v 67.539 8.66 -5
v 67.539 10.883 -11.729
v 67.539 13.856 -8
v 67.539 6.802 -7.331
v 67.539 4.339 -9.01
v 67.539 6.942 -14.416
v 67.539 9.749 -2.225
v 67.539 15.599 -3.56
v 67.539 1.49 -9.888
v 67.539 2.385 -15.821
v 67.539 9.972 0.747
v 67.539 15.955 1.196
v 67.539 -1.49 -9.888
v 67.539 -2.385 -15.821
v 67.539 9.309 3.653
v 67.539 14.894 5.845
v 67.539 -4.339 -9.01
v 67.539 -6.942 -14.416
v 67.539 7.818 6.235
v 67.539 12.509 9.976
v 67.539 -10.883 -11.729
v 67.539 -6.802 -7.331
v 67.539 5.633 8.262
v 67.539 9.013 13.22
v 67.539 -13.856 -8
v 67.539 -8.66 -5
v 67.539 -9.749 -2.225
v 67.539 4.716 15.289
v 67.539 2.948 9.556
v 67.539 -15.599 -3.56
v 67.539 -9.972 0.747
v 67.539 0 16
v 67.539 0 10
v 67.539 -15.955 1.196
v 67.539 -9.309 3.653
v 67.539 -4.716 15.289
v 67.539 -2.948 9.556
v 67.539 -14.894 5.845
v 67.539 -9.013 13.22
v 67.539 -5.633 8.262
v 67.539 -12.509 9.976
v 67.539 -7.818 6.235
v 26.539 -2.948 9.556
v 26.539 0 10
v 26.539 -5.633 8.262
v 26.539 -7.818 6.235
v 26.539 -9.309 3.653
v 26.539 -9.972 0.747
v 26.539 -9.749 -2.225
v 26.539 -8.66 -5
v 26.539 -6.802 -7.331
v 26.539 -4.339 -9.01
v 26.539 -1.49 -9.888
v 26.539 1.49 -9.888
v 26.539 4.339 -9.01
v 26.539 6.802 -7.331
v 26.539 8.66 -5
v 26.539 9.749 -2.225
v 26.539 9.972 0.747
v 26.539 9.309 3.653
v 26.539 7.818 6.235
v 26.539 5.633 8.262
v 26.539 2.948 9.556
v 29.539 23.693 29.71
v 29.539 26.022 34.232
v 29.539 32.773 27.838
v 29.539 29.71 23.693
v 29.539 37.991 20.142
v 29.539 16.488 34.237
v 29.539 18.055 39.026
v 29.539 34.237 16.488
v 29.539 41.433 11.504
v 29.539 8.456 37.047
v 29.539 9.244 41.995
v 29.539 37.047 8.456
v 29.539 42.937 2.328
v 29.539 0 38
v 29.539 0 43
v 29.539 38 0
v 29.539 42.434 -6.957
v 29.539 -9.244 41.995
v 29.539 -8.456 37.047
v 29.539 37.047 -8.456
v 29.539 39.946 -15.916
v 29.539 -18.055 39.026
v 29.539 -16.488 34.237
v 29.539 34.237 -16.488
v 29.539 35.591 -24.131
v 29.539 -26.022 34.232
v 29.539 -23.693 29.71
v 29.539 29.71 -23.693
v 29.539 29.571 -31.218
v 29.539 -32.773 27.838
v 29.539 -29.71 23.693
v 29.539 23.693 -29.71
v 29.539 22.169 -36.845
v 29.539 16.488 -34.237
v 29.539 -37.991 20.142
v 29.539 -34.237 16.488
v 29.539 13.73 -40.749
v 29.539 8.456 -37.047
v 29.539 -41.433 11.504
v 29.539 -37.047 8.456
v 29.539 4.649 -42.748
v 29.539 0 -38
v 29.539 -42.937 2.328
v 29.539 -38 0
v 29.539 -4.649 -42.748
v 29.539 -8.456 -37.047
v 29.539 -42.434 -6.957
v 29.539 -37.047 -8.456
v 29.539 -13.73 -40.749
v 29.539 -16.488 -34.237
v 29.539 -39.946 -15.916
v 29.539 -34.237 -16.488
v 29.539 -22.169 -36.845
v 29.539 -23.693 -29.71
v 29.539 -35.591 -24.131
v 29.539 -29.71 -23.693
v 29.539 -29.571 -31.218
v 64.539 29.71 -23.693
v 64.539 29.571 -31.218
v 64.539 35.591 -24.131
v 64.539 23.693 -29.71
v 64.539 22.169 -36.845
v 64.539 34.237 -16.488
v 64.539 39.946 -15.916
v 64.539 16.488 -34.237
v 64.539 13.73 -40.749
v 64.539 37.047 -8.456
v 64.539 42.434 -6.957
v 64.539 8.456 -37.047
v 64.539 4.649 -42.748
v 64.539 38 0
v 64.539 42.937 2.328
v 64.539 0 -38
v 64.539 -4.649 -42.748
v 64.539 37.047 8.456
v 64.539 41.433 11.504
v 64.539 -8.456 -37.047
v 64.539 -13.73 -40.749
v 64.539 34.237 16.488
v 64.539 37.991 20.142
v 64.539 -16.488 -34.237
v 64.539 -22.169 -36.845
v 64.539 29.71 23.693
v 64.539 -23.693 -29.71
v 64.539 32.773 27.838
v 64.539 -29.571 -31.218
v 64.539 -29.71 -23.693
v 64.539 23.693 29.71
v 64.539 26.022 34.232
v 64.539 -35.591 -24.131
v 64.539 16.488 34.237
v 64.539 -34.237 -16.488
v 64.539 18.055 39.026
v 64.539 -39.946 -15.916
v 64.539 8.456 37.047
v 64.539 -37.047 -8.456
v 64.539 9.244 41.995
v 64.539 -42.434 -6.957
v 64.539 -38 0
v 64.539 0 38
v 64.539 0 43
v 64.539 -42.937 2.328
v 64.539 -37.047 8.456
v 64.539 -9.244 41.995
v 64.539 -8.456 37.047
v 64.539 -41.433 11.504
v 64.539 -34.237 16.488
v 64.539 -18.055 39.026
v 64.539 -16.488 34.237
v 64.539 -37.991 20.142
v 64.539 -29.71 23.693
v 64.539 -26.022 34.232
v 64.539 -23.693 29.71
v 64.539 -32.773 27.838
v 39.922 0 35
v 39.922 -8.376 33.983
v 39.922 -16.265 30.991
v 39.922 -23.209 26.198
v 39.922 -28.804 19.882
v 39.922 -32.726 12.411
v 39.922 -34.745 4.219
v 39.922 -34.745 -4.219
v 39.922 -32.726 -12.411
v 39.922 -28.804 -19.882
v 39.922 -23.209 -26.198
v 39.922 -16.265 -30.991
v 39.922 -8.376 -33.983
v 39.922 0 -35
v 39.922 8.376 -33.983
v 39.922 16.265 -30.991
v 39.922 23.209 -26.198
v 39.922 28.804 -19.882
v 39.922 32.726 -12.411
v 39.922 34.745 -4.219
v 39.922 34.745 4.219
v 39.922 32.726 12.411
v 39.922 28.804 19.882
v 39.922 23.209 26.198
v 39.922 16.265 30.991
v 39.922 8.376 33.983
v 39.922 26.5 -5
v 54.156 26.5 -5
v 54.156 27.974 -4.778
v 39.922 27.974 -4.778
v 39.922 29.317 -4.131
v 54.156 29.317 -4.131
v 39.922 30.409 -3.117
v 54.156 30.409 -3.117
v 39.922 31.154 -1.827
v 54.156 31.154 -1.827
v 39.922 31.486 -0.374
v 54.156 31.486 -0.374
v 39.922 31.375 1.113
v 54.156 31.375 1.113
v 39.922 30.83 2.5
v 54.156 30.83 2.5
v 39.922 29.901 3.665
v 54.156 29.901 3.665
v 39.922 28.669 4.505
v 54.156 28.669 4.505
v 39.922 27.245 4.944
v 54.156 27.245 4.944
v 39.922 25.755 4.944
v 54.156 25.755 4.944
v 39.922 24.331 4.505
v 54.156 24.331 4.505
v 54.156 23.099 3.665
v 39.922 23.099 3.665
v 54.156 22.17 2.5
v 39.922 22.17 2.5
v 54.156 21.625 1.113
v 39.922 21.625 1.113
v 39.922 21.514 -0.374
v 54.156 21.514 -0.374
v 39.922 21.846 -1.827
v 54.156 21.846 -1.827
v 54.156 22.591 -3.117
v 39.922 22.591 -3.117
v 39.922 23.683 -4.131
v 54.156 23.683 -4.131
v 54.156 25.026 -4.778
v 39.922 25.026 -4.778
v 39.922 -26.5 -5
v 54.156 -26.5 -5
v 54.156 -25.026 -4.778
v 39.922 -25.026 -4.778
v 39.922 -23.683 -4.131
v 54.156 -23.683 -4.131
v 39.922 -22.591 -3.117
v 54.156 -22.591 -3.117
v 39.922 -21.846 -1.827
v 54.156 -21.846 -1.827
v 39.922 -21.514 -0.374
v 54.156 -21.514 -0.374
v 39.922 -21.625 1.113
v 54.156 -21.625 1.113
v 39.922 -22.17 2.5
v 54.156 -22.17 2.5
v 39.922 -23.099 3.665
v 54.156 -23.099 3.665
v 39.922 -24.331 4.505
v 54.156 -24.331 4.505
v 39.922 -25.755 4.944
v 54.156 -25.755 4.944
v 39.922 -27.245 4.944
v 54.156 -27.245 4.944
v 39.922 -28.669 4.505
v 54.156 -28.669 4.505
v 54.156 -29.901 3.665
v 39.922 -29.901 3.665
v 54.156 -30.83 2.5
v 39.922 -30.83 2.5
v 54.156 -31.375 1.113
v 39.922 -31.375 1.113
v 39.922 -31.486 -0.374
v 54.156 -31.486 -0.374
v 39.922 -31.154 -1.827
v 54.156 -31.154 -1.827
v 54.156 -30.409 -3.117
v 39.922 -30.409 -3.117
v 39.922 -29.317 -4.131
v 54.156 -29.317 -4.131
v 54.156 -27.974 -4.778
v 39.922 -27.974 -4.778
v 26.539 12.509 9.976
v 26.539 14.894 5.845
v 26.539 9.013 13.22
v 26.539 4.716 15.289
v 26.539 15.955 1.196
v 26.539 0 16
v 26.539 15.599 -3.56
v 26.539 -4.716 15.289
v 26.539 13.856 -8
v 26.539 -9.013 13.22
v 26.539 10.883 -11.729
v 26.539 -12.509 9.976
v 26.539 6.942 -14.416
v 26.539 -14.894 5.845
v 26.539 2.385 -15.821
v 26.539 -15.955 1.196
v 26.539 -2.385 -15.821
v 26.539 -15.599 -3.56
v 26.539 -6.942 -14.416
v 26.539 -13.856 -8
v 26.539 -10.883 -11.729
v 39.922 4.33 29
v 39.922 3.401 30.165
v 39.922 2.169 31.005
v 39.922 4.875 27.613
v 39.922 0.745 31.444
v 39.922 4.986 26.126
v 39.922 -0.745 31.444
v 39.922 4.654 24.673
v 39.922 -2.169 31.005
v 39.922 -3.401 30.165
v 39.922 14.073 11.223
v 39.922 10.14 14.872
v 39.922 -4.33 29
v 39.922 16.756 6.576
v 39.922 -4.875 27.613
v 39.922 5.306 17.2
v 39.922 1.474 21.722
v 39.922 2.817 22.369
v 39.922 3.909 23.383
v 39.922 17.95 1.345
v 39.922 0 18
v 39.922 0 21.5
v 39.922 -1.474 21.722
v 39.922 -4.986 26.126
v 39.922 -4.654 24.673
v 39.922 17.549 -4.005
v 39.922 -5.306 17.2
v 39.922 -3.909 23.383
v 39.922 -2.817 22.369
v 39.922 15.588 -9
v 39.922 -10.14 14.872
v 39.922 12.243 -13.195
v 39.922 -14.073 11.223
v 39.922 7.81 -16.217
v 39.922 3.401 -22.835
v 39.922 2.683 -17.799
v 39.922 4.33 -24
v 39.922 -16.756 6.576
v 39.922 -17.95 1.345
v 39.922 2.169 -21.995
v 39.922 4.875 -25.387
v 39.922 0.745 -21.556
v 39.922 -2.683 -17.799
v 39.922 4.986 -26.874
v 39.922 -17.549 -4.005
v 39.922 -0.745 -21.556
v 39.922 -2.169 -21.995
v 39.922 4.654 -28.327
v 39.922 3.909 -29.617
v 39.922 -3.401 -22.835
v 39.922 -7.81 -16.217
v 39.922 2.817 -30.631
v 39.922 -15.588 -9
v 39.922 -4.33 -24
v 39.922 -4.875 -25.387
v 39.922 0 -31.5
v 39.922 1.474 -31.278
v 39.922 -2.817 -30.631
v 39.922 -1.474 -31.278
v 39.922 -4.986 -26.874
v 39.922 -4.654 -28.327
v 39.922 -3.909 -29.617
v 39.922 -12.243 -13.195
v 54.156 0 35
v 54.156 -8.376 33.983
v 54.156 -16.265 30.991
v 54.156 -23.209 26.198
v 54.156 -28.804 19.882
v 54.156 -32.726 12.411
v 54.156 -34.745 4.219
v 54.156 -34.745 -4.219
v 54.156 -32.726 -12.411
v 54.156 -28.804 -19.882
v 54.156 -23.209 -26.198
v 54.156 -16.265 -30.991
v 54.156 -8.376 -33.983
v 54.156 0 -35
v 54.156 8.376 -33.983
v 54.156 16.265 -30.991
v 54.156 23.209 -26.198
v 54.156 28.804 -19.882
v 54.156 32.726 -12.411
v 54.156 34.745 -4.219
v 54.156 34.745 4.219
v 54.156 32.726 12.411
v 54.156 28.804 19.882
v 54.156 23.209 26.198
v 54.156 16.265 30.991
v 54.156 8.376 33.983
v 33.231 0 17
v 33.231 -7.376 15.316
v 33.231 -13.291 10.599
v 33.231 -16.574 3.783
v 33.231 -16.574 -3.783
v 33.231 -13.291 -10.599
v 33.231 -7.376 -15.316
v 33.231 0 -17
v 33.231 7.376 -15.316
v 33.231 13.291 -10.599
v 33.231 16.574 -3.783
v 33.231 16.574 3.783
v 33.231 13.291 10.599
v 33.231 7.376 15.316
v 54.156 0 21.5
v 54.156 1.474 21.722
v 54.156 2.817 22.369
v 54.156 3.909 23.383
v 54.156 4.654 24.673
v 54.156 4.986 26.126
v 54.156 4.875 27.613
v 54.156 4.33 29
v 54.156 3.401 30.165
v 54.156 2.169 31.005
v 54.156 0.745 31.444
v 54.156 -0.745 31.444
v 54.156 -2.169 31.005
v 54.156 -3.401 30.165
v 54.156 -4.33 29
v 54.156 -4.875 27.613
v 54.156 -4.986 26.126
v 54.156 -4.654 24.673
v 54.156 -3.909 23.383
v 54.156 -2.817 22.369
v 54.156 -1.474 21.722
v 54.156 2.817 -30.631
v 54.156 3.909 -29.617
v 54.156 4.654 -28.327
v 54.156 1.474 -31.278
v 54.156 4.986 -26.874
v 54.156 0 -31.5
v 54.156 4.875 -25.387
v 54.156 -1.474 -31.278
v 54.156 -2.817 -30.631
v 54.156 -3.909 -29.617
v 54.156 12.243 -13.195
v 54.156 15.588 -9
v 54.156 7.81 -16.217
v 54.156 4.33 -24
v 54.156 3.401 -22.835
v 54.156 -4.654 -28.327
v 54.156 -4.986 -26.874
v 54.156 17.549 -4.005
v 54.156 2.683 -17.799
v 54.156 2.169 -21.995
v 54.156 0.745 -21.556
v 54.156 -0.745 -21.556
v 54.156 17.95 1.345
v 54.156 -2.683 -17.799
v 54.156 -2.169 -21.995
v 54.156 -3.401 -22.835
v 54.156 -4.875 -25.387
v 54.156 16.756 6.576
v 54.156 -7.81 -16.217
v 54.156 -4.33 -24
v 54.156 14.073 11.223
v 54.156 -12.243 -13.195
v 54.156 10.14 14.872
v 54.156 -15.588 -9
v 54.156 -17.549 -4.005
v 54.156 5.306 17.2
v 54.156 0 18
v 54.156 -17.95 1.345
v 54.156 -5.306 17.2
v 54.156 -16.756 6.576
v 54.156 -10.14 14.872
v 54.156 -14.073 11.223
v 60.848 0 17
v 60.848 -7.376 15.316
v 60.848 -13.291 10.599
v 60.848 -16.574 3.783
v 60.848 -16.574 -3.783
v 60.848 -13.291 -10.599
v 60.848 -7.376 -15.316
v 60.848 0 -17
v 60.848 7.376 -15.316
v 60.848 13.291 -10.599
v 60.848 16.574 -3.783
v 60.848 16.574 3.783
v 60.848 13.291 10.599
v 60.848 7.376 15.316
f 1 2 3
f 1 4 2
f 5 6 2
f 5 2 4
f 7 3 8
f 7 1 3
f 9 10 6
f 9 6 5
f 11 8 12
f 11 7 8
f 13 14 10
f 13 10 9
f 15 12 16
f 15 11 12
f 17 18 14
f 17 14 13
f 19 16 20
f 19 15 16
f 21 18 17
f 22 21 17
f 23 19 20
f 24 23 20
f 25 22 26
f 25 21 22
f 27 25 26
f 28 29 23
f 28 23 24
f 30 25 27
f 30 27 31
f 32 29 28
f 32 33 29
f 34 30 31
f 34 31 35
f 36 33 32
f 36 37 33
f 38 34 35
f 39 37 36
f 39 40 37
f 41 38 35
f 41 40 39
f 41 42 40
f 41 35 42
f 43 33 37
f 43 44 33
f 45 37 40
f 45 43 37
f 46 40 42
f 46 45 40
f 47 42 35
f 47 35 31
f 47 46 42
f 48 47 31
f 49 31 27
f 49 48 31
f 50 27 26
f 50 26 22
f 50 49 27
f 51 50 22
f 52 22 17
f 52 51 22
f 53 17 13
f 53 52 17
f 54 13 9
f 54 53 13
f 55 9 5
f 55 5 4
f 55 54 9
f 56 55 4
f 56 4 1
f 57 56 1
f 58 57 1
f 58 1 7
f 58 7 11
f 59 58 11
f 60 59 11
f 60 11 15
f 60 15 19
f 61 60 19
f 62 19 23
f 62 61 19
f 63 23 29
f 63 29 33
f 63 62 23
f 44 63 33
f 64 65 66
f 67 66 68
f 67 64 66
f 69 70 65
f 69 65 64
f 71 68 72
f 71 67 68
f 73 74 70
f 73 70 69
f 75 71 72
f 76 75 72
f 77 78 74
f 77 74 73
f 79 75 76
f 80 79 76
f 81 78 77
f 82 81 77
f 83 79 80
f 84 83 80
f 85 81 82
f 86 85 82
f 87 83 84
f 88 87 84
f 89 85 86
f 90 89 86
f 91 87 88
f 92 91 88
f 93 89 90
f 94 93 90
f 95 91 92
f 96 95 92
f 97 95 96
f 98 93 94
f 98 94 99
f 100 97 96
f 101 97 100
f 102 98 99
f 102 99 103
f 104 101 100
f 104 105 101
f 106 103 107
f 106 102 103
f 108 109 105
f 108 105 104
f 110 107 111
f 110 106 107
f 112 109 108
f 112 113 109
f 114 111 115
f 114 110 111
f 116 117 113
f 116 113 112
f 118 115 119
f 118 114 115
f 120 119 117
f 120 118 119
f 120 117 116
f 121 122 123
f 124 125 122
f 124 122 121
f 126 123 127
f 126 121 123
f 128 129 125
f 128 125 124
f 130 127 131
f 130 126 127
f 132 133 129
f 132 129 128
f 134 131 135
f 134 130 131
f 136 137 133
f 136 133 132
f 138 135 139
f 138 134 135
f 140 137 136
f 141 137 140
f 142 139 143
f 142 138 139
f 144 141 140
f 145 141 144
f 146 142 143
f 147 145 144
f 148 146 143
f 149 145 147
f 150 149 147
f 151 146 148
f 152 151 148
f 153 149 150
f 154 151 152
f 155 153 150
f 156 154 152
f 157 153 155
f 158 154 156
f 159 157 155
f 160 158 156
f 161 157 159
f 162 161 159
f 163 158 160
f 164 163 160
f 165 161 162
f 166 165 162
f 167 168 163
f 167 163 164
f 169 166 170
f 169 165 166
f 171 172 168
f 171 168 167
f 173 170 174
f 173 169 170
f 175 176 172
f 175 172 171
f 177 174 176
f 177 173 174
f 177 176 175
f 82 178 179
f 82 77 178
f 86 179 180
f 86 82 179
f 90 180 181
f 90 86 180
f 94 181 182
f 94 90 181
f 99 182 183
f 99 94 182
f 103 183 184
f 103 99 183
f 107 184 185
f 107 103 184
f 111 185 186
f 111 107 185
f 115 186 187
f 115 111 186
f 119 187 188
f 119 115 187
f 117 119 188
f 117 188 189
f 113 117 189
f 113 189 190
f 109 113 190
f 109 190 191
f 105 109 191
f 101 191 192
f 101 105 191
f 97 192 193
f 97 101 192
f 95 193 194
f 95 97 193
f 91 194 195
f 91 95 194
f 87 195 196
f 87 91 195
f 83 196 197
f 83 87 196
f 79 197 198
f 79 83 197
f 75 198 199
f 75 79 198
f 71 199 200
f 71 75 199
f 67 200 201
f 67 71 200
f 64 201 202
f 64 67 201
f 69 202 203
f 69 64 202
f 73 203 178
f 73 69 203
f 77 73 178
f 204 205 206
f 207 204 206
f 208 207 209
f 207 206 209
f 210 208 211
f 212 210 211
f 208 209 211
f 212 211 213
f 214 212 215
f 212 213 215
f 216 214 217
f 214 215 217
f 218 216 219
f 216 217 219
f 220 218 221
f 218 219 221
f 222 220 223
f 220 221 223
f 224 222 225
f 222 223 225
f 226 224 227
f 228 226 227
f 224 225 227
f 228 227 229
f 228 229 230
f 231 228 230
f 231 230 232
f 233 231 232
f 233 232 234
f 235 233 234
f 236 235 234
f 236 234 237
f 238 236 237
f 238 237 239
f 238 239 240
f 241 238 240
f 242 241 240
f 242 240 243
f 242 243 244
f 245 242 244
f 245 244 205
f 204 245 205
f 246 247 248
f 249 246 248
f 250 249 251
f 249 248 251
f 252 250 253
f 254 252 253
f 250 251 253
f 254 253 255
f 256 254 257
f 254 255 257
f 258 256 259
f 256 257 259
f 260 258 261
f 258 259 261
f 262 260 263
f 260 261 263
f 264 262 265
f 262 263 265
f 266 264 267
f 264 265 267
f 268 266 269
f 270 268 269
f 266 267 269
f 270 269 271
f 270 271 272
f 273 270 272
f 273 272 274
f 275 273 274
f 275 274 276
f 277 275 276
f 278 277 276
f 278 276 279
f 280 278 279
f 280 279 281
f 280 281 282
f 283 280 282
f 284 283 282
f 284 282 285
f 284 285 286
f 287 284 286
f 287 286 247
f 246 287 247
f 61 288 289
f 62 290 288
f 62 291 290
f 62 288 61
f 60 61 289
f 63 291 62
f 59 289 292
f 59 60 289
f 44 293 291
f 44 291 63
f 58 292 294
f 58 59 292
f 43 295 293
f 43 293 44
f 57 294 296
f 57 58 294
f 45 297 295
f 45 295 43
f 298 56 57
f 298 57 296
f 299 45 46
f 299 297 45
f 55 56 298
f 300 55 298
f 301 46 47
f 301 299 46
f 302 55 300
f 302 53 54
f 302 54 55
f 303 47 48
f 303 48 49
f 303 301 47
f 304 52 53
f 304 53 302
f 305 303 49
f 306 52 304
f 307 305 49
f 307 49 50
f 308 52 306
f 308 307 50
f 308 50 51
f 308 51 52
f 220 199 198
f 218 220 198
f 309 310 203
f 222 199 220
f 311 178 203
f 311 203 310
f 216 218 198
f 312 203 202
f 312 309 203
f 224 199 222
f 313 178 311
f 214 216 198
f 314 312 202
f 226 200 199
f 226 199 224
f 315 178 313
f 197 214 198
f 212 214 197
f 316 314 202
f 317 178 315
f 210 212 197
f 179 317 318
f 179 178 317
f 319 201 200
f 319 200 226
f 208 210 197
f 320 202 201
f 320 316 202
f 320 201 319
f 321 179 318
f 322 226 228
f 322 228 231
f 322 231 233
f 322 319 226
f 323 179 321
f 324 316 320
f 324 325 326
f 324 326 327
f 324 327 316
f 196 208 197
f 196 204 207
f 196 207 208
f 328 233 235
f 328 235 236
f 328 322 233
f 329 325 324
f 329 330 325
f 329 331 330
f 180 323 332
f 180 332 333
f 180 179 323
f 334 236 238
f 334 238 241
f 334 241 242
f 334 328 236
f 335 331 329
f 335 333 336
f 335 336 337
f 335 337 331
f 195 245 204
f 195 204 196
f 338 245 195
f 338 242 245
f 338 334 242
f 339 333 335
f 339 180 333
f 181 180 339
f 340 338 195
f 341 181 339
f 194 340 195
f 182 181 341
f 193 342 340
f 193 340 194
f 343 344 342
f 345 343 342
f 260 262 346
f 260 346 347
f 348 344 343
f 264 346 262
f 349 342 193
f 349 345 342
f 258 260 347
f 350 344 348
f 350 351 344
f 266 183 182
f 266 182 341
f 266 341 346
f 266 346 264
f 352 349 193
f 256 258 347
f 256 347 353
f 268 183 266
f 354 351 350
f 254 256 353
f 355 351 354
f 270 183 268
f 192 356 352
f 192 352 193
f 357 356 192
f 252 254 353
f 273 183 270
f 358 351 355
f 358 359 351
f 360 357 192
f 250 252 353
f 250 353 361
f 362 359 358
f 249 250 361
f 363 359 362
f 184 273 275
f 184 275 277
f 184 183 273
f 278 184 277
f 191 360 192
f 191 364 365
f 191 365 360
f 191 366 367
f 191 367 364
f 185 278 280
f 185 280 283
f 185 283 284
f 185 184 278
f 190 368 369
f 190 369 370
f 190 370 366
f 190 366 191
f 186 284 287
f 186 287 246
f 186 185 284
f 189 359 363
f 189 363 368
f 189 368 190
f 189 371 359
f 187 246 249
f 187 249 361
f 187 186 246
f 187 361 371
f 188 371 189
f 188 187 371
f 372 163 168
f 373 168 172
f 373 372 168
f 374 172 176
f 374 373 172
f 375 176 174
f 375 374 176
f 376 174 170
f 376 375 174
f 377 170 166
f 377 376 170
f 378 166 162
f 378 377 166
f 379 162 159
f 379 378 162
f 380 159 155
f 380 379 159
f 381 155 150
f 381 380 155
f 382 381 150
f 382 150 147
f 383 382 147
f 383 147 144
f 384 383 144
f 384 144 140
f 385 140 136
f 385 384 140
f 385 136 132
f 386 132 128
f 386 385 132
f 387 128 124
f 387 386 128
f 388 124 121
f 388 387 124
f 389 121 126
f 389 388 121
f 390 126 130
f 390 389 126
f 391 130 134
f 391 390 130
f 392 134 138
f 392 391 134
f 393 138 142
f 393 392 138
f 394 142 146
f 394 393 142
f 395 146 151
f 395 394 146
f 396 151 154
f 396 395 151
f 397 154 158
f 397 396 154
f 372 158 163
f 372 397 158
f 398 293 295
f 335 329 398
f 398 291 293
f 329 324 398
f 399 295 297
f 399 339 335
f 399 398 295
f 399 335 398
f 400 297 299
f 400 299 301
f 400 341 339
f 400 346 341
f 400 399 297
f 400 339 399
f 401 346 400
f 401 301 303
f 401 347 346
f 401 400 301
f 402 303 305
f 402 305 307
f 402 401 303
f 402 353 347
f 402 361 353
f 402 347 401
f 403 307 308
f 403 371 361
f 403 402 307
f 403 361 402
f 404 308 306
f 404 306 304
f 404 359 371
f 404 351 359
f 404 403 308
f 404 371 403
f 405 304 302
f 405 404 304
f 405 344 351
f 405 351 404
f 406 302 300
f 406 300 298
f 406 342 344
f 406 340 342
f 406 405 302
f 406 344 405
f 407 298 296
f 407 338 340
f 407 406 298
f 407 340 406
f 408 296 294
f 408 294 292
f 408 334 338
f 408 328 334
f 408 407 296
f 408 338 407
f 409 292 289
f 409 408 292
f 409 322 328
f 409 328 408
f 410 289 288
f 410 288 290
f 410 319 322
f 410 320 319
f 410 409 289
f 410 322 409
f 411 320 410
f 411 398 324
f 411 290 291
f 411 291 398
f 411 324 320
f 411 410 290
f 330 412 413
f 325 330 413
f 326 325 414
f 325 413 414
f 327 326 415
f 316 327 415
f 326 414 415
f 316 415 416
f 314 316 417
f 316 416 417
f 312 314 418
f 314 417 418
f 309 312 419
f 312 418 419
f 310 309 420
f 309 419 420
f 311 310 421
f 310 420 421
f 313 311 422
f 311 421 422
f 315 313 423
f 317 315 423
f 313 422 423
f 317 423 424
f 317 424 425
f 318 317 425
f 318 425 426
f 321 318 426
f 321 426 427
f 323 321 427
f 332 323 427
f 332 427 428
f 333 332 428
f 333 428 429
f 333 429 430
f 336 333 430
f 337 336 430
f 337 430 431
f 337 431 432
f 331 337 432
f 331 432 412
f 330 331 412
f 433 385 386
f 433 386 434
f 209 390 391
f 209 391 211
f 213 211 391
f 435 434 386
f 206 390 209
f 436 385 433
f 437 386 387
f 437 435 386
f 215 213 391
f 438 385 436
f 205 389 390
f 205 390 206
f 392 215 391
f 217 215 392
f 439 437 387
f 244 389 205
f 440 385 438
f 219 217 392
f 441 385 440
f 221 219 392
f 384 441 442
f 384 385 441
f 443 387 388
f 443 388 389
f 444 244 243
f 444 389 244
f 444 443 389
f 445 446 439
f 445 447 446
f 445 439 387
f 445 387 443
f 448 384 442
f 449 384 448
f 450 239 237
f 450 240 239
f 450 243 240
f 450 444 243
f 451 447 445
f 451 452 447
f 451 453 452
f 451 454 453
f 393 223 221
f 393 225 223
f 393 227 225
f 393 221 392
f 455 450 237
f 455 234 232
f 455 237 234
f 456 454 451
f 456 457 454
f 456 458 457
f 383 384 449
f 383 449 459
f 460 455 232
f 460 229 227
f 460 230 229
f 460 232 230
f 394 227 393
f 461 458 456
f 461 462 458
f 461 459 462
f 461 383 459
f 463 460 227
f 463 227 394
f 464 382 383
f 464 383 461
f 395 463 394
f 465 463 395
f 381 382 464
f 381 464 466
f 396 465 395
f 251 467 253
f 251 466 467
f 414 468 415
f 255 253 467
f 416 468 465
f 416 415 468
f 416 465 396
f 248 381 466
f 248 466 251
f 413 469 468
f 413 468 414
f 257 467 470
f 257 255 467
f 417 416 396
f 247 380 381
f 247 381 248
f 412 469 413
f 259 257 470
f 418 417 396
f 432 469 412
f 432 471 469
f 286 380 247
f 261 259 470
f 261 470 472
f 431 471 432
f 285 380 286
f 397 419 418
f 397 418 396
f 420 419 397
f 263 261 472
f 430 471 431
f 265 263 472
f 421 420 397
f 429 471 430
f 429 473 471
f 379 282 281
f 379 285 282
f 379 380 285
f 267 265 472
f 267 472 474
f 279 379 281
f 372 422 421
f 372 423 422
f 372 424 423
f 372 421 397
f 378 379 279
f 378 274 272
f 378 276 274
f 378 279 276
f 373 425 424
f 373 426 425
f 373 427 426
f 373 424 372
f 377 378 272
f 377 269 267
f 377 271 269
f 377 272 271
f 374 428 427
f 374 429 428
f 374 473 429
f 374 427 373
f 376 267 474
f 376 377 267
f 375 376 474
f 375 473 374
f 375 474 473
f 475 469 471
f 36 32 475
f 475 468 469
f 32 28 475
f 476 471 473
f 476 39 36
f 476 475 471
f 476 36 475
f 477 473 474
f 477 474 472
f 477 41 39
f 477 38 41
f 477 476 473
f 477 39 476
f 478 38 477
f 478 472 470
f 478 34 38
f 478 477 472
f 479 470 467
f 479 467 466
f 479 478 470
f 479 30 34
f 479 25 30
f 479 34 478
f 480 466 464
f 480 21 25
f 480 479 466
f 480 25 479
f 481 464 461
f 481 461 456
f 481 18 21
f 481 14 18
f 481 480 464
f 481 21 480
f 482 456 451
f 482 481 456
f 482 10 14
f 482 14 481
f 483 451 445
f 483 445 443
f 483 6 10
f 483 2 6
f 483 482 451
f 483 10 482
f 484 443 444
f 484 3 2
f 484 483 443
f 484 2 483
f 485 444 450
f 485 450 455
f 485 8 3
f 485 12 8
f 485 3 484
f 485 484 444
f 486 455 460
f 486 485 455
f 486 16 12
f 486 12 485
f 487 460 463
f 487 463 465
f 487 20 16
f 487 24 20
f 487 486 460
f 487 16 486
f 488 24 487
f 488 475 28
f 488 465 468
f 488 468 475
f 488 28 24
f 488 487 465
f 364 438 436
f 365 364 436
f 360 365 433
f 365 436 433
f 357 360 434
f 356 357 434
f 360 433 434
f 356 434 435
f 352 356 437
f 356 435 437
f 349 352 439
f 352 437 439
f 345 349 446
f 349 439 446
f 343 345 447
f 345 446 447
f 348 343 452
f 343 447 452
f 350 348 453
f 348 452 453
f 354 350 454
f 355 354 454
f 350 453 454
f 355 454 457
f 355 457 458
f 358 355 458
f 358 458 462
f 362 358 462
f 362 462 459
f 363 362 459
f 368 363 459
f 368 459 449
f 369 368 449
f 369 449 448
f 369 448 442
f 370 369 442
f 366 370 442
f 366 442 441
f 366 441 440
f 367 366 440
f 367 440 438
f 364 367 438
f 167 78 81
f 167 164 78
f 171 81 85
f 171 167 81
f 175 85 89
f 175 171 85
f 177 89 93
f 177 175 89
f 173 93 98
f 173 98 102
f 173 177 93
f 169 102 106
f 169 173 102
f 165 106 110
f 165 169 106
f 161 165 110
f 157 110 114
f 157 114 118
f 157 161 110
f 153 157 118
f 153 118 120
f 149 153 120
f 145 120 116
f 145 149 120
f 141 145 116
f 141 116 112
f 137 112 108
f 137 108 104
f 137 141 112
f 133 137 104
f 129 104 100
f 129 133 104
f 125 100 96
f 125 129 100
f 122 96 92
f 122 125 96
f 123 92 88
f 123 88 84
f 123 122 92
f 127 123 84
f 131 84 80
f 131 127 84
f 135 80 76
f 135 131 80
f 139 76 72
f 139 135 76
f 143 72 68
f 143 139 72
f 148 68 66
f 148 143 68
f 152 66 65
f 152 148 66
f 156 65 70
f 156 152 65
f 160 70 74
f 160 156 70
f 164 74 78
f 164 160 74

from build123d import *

# Parameters (mm, degrees)
SKETCH2_R          = 5
CUT_EXTRUDE1_DEPTH = 25


with BuildPart() as part:
    # Sketch1 → Revolve1 (revolve)
    with BuildSketch(Plane.XY, mode=Mode.PRIVATE) as revolve1_sk:
        Polygon((67.539059874, 10), (26.539059874, 10), (26.539059874, 16), (39.922105525, 18), (39.922105525, 35), (29.539059874, 38), (29.539059874, 43), (64.539059874, 43), (64.539059874, 38), (54.156014223, 35), (54.156014223, 18), (67.539059874, 16), align=None)
    revolve(revolve1_sk.sketch.rotate(Axis((0, 0, 0), (1, 0, 0)), 90), axis=Axis((0, 0, 0), (1, 0, 0)))

    # Sketch2 → Cut-Extrude1 (cut)
    with BuildSketch(Plane(origin=(54.156014223, 0, 0), x_dir=(0, 0, -1), z_dir=(1, 0, 0))):
        with Locations((0, 26.5)):
            Circle(SKETCH2_R)
        with Locations((26.5, 0)):
            Circle(SKETCH2_R)
        with Locations((0, -26.5)):
            Circle(SKETCH2_R)
        with Locations((-26.5, 0)):
            Circle(SKETCH2_R)
    extrude(amount=-CUT_EXTRUDE1_DEPTH, mode=Mode.SUBTRACT)


solid = part.part
